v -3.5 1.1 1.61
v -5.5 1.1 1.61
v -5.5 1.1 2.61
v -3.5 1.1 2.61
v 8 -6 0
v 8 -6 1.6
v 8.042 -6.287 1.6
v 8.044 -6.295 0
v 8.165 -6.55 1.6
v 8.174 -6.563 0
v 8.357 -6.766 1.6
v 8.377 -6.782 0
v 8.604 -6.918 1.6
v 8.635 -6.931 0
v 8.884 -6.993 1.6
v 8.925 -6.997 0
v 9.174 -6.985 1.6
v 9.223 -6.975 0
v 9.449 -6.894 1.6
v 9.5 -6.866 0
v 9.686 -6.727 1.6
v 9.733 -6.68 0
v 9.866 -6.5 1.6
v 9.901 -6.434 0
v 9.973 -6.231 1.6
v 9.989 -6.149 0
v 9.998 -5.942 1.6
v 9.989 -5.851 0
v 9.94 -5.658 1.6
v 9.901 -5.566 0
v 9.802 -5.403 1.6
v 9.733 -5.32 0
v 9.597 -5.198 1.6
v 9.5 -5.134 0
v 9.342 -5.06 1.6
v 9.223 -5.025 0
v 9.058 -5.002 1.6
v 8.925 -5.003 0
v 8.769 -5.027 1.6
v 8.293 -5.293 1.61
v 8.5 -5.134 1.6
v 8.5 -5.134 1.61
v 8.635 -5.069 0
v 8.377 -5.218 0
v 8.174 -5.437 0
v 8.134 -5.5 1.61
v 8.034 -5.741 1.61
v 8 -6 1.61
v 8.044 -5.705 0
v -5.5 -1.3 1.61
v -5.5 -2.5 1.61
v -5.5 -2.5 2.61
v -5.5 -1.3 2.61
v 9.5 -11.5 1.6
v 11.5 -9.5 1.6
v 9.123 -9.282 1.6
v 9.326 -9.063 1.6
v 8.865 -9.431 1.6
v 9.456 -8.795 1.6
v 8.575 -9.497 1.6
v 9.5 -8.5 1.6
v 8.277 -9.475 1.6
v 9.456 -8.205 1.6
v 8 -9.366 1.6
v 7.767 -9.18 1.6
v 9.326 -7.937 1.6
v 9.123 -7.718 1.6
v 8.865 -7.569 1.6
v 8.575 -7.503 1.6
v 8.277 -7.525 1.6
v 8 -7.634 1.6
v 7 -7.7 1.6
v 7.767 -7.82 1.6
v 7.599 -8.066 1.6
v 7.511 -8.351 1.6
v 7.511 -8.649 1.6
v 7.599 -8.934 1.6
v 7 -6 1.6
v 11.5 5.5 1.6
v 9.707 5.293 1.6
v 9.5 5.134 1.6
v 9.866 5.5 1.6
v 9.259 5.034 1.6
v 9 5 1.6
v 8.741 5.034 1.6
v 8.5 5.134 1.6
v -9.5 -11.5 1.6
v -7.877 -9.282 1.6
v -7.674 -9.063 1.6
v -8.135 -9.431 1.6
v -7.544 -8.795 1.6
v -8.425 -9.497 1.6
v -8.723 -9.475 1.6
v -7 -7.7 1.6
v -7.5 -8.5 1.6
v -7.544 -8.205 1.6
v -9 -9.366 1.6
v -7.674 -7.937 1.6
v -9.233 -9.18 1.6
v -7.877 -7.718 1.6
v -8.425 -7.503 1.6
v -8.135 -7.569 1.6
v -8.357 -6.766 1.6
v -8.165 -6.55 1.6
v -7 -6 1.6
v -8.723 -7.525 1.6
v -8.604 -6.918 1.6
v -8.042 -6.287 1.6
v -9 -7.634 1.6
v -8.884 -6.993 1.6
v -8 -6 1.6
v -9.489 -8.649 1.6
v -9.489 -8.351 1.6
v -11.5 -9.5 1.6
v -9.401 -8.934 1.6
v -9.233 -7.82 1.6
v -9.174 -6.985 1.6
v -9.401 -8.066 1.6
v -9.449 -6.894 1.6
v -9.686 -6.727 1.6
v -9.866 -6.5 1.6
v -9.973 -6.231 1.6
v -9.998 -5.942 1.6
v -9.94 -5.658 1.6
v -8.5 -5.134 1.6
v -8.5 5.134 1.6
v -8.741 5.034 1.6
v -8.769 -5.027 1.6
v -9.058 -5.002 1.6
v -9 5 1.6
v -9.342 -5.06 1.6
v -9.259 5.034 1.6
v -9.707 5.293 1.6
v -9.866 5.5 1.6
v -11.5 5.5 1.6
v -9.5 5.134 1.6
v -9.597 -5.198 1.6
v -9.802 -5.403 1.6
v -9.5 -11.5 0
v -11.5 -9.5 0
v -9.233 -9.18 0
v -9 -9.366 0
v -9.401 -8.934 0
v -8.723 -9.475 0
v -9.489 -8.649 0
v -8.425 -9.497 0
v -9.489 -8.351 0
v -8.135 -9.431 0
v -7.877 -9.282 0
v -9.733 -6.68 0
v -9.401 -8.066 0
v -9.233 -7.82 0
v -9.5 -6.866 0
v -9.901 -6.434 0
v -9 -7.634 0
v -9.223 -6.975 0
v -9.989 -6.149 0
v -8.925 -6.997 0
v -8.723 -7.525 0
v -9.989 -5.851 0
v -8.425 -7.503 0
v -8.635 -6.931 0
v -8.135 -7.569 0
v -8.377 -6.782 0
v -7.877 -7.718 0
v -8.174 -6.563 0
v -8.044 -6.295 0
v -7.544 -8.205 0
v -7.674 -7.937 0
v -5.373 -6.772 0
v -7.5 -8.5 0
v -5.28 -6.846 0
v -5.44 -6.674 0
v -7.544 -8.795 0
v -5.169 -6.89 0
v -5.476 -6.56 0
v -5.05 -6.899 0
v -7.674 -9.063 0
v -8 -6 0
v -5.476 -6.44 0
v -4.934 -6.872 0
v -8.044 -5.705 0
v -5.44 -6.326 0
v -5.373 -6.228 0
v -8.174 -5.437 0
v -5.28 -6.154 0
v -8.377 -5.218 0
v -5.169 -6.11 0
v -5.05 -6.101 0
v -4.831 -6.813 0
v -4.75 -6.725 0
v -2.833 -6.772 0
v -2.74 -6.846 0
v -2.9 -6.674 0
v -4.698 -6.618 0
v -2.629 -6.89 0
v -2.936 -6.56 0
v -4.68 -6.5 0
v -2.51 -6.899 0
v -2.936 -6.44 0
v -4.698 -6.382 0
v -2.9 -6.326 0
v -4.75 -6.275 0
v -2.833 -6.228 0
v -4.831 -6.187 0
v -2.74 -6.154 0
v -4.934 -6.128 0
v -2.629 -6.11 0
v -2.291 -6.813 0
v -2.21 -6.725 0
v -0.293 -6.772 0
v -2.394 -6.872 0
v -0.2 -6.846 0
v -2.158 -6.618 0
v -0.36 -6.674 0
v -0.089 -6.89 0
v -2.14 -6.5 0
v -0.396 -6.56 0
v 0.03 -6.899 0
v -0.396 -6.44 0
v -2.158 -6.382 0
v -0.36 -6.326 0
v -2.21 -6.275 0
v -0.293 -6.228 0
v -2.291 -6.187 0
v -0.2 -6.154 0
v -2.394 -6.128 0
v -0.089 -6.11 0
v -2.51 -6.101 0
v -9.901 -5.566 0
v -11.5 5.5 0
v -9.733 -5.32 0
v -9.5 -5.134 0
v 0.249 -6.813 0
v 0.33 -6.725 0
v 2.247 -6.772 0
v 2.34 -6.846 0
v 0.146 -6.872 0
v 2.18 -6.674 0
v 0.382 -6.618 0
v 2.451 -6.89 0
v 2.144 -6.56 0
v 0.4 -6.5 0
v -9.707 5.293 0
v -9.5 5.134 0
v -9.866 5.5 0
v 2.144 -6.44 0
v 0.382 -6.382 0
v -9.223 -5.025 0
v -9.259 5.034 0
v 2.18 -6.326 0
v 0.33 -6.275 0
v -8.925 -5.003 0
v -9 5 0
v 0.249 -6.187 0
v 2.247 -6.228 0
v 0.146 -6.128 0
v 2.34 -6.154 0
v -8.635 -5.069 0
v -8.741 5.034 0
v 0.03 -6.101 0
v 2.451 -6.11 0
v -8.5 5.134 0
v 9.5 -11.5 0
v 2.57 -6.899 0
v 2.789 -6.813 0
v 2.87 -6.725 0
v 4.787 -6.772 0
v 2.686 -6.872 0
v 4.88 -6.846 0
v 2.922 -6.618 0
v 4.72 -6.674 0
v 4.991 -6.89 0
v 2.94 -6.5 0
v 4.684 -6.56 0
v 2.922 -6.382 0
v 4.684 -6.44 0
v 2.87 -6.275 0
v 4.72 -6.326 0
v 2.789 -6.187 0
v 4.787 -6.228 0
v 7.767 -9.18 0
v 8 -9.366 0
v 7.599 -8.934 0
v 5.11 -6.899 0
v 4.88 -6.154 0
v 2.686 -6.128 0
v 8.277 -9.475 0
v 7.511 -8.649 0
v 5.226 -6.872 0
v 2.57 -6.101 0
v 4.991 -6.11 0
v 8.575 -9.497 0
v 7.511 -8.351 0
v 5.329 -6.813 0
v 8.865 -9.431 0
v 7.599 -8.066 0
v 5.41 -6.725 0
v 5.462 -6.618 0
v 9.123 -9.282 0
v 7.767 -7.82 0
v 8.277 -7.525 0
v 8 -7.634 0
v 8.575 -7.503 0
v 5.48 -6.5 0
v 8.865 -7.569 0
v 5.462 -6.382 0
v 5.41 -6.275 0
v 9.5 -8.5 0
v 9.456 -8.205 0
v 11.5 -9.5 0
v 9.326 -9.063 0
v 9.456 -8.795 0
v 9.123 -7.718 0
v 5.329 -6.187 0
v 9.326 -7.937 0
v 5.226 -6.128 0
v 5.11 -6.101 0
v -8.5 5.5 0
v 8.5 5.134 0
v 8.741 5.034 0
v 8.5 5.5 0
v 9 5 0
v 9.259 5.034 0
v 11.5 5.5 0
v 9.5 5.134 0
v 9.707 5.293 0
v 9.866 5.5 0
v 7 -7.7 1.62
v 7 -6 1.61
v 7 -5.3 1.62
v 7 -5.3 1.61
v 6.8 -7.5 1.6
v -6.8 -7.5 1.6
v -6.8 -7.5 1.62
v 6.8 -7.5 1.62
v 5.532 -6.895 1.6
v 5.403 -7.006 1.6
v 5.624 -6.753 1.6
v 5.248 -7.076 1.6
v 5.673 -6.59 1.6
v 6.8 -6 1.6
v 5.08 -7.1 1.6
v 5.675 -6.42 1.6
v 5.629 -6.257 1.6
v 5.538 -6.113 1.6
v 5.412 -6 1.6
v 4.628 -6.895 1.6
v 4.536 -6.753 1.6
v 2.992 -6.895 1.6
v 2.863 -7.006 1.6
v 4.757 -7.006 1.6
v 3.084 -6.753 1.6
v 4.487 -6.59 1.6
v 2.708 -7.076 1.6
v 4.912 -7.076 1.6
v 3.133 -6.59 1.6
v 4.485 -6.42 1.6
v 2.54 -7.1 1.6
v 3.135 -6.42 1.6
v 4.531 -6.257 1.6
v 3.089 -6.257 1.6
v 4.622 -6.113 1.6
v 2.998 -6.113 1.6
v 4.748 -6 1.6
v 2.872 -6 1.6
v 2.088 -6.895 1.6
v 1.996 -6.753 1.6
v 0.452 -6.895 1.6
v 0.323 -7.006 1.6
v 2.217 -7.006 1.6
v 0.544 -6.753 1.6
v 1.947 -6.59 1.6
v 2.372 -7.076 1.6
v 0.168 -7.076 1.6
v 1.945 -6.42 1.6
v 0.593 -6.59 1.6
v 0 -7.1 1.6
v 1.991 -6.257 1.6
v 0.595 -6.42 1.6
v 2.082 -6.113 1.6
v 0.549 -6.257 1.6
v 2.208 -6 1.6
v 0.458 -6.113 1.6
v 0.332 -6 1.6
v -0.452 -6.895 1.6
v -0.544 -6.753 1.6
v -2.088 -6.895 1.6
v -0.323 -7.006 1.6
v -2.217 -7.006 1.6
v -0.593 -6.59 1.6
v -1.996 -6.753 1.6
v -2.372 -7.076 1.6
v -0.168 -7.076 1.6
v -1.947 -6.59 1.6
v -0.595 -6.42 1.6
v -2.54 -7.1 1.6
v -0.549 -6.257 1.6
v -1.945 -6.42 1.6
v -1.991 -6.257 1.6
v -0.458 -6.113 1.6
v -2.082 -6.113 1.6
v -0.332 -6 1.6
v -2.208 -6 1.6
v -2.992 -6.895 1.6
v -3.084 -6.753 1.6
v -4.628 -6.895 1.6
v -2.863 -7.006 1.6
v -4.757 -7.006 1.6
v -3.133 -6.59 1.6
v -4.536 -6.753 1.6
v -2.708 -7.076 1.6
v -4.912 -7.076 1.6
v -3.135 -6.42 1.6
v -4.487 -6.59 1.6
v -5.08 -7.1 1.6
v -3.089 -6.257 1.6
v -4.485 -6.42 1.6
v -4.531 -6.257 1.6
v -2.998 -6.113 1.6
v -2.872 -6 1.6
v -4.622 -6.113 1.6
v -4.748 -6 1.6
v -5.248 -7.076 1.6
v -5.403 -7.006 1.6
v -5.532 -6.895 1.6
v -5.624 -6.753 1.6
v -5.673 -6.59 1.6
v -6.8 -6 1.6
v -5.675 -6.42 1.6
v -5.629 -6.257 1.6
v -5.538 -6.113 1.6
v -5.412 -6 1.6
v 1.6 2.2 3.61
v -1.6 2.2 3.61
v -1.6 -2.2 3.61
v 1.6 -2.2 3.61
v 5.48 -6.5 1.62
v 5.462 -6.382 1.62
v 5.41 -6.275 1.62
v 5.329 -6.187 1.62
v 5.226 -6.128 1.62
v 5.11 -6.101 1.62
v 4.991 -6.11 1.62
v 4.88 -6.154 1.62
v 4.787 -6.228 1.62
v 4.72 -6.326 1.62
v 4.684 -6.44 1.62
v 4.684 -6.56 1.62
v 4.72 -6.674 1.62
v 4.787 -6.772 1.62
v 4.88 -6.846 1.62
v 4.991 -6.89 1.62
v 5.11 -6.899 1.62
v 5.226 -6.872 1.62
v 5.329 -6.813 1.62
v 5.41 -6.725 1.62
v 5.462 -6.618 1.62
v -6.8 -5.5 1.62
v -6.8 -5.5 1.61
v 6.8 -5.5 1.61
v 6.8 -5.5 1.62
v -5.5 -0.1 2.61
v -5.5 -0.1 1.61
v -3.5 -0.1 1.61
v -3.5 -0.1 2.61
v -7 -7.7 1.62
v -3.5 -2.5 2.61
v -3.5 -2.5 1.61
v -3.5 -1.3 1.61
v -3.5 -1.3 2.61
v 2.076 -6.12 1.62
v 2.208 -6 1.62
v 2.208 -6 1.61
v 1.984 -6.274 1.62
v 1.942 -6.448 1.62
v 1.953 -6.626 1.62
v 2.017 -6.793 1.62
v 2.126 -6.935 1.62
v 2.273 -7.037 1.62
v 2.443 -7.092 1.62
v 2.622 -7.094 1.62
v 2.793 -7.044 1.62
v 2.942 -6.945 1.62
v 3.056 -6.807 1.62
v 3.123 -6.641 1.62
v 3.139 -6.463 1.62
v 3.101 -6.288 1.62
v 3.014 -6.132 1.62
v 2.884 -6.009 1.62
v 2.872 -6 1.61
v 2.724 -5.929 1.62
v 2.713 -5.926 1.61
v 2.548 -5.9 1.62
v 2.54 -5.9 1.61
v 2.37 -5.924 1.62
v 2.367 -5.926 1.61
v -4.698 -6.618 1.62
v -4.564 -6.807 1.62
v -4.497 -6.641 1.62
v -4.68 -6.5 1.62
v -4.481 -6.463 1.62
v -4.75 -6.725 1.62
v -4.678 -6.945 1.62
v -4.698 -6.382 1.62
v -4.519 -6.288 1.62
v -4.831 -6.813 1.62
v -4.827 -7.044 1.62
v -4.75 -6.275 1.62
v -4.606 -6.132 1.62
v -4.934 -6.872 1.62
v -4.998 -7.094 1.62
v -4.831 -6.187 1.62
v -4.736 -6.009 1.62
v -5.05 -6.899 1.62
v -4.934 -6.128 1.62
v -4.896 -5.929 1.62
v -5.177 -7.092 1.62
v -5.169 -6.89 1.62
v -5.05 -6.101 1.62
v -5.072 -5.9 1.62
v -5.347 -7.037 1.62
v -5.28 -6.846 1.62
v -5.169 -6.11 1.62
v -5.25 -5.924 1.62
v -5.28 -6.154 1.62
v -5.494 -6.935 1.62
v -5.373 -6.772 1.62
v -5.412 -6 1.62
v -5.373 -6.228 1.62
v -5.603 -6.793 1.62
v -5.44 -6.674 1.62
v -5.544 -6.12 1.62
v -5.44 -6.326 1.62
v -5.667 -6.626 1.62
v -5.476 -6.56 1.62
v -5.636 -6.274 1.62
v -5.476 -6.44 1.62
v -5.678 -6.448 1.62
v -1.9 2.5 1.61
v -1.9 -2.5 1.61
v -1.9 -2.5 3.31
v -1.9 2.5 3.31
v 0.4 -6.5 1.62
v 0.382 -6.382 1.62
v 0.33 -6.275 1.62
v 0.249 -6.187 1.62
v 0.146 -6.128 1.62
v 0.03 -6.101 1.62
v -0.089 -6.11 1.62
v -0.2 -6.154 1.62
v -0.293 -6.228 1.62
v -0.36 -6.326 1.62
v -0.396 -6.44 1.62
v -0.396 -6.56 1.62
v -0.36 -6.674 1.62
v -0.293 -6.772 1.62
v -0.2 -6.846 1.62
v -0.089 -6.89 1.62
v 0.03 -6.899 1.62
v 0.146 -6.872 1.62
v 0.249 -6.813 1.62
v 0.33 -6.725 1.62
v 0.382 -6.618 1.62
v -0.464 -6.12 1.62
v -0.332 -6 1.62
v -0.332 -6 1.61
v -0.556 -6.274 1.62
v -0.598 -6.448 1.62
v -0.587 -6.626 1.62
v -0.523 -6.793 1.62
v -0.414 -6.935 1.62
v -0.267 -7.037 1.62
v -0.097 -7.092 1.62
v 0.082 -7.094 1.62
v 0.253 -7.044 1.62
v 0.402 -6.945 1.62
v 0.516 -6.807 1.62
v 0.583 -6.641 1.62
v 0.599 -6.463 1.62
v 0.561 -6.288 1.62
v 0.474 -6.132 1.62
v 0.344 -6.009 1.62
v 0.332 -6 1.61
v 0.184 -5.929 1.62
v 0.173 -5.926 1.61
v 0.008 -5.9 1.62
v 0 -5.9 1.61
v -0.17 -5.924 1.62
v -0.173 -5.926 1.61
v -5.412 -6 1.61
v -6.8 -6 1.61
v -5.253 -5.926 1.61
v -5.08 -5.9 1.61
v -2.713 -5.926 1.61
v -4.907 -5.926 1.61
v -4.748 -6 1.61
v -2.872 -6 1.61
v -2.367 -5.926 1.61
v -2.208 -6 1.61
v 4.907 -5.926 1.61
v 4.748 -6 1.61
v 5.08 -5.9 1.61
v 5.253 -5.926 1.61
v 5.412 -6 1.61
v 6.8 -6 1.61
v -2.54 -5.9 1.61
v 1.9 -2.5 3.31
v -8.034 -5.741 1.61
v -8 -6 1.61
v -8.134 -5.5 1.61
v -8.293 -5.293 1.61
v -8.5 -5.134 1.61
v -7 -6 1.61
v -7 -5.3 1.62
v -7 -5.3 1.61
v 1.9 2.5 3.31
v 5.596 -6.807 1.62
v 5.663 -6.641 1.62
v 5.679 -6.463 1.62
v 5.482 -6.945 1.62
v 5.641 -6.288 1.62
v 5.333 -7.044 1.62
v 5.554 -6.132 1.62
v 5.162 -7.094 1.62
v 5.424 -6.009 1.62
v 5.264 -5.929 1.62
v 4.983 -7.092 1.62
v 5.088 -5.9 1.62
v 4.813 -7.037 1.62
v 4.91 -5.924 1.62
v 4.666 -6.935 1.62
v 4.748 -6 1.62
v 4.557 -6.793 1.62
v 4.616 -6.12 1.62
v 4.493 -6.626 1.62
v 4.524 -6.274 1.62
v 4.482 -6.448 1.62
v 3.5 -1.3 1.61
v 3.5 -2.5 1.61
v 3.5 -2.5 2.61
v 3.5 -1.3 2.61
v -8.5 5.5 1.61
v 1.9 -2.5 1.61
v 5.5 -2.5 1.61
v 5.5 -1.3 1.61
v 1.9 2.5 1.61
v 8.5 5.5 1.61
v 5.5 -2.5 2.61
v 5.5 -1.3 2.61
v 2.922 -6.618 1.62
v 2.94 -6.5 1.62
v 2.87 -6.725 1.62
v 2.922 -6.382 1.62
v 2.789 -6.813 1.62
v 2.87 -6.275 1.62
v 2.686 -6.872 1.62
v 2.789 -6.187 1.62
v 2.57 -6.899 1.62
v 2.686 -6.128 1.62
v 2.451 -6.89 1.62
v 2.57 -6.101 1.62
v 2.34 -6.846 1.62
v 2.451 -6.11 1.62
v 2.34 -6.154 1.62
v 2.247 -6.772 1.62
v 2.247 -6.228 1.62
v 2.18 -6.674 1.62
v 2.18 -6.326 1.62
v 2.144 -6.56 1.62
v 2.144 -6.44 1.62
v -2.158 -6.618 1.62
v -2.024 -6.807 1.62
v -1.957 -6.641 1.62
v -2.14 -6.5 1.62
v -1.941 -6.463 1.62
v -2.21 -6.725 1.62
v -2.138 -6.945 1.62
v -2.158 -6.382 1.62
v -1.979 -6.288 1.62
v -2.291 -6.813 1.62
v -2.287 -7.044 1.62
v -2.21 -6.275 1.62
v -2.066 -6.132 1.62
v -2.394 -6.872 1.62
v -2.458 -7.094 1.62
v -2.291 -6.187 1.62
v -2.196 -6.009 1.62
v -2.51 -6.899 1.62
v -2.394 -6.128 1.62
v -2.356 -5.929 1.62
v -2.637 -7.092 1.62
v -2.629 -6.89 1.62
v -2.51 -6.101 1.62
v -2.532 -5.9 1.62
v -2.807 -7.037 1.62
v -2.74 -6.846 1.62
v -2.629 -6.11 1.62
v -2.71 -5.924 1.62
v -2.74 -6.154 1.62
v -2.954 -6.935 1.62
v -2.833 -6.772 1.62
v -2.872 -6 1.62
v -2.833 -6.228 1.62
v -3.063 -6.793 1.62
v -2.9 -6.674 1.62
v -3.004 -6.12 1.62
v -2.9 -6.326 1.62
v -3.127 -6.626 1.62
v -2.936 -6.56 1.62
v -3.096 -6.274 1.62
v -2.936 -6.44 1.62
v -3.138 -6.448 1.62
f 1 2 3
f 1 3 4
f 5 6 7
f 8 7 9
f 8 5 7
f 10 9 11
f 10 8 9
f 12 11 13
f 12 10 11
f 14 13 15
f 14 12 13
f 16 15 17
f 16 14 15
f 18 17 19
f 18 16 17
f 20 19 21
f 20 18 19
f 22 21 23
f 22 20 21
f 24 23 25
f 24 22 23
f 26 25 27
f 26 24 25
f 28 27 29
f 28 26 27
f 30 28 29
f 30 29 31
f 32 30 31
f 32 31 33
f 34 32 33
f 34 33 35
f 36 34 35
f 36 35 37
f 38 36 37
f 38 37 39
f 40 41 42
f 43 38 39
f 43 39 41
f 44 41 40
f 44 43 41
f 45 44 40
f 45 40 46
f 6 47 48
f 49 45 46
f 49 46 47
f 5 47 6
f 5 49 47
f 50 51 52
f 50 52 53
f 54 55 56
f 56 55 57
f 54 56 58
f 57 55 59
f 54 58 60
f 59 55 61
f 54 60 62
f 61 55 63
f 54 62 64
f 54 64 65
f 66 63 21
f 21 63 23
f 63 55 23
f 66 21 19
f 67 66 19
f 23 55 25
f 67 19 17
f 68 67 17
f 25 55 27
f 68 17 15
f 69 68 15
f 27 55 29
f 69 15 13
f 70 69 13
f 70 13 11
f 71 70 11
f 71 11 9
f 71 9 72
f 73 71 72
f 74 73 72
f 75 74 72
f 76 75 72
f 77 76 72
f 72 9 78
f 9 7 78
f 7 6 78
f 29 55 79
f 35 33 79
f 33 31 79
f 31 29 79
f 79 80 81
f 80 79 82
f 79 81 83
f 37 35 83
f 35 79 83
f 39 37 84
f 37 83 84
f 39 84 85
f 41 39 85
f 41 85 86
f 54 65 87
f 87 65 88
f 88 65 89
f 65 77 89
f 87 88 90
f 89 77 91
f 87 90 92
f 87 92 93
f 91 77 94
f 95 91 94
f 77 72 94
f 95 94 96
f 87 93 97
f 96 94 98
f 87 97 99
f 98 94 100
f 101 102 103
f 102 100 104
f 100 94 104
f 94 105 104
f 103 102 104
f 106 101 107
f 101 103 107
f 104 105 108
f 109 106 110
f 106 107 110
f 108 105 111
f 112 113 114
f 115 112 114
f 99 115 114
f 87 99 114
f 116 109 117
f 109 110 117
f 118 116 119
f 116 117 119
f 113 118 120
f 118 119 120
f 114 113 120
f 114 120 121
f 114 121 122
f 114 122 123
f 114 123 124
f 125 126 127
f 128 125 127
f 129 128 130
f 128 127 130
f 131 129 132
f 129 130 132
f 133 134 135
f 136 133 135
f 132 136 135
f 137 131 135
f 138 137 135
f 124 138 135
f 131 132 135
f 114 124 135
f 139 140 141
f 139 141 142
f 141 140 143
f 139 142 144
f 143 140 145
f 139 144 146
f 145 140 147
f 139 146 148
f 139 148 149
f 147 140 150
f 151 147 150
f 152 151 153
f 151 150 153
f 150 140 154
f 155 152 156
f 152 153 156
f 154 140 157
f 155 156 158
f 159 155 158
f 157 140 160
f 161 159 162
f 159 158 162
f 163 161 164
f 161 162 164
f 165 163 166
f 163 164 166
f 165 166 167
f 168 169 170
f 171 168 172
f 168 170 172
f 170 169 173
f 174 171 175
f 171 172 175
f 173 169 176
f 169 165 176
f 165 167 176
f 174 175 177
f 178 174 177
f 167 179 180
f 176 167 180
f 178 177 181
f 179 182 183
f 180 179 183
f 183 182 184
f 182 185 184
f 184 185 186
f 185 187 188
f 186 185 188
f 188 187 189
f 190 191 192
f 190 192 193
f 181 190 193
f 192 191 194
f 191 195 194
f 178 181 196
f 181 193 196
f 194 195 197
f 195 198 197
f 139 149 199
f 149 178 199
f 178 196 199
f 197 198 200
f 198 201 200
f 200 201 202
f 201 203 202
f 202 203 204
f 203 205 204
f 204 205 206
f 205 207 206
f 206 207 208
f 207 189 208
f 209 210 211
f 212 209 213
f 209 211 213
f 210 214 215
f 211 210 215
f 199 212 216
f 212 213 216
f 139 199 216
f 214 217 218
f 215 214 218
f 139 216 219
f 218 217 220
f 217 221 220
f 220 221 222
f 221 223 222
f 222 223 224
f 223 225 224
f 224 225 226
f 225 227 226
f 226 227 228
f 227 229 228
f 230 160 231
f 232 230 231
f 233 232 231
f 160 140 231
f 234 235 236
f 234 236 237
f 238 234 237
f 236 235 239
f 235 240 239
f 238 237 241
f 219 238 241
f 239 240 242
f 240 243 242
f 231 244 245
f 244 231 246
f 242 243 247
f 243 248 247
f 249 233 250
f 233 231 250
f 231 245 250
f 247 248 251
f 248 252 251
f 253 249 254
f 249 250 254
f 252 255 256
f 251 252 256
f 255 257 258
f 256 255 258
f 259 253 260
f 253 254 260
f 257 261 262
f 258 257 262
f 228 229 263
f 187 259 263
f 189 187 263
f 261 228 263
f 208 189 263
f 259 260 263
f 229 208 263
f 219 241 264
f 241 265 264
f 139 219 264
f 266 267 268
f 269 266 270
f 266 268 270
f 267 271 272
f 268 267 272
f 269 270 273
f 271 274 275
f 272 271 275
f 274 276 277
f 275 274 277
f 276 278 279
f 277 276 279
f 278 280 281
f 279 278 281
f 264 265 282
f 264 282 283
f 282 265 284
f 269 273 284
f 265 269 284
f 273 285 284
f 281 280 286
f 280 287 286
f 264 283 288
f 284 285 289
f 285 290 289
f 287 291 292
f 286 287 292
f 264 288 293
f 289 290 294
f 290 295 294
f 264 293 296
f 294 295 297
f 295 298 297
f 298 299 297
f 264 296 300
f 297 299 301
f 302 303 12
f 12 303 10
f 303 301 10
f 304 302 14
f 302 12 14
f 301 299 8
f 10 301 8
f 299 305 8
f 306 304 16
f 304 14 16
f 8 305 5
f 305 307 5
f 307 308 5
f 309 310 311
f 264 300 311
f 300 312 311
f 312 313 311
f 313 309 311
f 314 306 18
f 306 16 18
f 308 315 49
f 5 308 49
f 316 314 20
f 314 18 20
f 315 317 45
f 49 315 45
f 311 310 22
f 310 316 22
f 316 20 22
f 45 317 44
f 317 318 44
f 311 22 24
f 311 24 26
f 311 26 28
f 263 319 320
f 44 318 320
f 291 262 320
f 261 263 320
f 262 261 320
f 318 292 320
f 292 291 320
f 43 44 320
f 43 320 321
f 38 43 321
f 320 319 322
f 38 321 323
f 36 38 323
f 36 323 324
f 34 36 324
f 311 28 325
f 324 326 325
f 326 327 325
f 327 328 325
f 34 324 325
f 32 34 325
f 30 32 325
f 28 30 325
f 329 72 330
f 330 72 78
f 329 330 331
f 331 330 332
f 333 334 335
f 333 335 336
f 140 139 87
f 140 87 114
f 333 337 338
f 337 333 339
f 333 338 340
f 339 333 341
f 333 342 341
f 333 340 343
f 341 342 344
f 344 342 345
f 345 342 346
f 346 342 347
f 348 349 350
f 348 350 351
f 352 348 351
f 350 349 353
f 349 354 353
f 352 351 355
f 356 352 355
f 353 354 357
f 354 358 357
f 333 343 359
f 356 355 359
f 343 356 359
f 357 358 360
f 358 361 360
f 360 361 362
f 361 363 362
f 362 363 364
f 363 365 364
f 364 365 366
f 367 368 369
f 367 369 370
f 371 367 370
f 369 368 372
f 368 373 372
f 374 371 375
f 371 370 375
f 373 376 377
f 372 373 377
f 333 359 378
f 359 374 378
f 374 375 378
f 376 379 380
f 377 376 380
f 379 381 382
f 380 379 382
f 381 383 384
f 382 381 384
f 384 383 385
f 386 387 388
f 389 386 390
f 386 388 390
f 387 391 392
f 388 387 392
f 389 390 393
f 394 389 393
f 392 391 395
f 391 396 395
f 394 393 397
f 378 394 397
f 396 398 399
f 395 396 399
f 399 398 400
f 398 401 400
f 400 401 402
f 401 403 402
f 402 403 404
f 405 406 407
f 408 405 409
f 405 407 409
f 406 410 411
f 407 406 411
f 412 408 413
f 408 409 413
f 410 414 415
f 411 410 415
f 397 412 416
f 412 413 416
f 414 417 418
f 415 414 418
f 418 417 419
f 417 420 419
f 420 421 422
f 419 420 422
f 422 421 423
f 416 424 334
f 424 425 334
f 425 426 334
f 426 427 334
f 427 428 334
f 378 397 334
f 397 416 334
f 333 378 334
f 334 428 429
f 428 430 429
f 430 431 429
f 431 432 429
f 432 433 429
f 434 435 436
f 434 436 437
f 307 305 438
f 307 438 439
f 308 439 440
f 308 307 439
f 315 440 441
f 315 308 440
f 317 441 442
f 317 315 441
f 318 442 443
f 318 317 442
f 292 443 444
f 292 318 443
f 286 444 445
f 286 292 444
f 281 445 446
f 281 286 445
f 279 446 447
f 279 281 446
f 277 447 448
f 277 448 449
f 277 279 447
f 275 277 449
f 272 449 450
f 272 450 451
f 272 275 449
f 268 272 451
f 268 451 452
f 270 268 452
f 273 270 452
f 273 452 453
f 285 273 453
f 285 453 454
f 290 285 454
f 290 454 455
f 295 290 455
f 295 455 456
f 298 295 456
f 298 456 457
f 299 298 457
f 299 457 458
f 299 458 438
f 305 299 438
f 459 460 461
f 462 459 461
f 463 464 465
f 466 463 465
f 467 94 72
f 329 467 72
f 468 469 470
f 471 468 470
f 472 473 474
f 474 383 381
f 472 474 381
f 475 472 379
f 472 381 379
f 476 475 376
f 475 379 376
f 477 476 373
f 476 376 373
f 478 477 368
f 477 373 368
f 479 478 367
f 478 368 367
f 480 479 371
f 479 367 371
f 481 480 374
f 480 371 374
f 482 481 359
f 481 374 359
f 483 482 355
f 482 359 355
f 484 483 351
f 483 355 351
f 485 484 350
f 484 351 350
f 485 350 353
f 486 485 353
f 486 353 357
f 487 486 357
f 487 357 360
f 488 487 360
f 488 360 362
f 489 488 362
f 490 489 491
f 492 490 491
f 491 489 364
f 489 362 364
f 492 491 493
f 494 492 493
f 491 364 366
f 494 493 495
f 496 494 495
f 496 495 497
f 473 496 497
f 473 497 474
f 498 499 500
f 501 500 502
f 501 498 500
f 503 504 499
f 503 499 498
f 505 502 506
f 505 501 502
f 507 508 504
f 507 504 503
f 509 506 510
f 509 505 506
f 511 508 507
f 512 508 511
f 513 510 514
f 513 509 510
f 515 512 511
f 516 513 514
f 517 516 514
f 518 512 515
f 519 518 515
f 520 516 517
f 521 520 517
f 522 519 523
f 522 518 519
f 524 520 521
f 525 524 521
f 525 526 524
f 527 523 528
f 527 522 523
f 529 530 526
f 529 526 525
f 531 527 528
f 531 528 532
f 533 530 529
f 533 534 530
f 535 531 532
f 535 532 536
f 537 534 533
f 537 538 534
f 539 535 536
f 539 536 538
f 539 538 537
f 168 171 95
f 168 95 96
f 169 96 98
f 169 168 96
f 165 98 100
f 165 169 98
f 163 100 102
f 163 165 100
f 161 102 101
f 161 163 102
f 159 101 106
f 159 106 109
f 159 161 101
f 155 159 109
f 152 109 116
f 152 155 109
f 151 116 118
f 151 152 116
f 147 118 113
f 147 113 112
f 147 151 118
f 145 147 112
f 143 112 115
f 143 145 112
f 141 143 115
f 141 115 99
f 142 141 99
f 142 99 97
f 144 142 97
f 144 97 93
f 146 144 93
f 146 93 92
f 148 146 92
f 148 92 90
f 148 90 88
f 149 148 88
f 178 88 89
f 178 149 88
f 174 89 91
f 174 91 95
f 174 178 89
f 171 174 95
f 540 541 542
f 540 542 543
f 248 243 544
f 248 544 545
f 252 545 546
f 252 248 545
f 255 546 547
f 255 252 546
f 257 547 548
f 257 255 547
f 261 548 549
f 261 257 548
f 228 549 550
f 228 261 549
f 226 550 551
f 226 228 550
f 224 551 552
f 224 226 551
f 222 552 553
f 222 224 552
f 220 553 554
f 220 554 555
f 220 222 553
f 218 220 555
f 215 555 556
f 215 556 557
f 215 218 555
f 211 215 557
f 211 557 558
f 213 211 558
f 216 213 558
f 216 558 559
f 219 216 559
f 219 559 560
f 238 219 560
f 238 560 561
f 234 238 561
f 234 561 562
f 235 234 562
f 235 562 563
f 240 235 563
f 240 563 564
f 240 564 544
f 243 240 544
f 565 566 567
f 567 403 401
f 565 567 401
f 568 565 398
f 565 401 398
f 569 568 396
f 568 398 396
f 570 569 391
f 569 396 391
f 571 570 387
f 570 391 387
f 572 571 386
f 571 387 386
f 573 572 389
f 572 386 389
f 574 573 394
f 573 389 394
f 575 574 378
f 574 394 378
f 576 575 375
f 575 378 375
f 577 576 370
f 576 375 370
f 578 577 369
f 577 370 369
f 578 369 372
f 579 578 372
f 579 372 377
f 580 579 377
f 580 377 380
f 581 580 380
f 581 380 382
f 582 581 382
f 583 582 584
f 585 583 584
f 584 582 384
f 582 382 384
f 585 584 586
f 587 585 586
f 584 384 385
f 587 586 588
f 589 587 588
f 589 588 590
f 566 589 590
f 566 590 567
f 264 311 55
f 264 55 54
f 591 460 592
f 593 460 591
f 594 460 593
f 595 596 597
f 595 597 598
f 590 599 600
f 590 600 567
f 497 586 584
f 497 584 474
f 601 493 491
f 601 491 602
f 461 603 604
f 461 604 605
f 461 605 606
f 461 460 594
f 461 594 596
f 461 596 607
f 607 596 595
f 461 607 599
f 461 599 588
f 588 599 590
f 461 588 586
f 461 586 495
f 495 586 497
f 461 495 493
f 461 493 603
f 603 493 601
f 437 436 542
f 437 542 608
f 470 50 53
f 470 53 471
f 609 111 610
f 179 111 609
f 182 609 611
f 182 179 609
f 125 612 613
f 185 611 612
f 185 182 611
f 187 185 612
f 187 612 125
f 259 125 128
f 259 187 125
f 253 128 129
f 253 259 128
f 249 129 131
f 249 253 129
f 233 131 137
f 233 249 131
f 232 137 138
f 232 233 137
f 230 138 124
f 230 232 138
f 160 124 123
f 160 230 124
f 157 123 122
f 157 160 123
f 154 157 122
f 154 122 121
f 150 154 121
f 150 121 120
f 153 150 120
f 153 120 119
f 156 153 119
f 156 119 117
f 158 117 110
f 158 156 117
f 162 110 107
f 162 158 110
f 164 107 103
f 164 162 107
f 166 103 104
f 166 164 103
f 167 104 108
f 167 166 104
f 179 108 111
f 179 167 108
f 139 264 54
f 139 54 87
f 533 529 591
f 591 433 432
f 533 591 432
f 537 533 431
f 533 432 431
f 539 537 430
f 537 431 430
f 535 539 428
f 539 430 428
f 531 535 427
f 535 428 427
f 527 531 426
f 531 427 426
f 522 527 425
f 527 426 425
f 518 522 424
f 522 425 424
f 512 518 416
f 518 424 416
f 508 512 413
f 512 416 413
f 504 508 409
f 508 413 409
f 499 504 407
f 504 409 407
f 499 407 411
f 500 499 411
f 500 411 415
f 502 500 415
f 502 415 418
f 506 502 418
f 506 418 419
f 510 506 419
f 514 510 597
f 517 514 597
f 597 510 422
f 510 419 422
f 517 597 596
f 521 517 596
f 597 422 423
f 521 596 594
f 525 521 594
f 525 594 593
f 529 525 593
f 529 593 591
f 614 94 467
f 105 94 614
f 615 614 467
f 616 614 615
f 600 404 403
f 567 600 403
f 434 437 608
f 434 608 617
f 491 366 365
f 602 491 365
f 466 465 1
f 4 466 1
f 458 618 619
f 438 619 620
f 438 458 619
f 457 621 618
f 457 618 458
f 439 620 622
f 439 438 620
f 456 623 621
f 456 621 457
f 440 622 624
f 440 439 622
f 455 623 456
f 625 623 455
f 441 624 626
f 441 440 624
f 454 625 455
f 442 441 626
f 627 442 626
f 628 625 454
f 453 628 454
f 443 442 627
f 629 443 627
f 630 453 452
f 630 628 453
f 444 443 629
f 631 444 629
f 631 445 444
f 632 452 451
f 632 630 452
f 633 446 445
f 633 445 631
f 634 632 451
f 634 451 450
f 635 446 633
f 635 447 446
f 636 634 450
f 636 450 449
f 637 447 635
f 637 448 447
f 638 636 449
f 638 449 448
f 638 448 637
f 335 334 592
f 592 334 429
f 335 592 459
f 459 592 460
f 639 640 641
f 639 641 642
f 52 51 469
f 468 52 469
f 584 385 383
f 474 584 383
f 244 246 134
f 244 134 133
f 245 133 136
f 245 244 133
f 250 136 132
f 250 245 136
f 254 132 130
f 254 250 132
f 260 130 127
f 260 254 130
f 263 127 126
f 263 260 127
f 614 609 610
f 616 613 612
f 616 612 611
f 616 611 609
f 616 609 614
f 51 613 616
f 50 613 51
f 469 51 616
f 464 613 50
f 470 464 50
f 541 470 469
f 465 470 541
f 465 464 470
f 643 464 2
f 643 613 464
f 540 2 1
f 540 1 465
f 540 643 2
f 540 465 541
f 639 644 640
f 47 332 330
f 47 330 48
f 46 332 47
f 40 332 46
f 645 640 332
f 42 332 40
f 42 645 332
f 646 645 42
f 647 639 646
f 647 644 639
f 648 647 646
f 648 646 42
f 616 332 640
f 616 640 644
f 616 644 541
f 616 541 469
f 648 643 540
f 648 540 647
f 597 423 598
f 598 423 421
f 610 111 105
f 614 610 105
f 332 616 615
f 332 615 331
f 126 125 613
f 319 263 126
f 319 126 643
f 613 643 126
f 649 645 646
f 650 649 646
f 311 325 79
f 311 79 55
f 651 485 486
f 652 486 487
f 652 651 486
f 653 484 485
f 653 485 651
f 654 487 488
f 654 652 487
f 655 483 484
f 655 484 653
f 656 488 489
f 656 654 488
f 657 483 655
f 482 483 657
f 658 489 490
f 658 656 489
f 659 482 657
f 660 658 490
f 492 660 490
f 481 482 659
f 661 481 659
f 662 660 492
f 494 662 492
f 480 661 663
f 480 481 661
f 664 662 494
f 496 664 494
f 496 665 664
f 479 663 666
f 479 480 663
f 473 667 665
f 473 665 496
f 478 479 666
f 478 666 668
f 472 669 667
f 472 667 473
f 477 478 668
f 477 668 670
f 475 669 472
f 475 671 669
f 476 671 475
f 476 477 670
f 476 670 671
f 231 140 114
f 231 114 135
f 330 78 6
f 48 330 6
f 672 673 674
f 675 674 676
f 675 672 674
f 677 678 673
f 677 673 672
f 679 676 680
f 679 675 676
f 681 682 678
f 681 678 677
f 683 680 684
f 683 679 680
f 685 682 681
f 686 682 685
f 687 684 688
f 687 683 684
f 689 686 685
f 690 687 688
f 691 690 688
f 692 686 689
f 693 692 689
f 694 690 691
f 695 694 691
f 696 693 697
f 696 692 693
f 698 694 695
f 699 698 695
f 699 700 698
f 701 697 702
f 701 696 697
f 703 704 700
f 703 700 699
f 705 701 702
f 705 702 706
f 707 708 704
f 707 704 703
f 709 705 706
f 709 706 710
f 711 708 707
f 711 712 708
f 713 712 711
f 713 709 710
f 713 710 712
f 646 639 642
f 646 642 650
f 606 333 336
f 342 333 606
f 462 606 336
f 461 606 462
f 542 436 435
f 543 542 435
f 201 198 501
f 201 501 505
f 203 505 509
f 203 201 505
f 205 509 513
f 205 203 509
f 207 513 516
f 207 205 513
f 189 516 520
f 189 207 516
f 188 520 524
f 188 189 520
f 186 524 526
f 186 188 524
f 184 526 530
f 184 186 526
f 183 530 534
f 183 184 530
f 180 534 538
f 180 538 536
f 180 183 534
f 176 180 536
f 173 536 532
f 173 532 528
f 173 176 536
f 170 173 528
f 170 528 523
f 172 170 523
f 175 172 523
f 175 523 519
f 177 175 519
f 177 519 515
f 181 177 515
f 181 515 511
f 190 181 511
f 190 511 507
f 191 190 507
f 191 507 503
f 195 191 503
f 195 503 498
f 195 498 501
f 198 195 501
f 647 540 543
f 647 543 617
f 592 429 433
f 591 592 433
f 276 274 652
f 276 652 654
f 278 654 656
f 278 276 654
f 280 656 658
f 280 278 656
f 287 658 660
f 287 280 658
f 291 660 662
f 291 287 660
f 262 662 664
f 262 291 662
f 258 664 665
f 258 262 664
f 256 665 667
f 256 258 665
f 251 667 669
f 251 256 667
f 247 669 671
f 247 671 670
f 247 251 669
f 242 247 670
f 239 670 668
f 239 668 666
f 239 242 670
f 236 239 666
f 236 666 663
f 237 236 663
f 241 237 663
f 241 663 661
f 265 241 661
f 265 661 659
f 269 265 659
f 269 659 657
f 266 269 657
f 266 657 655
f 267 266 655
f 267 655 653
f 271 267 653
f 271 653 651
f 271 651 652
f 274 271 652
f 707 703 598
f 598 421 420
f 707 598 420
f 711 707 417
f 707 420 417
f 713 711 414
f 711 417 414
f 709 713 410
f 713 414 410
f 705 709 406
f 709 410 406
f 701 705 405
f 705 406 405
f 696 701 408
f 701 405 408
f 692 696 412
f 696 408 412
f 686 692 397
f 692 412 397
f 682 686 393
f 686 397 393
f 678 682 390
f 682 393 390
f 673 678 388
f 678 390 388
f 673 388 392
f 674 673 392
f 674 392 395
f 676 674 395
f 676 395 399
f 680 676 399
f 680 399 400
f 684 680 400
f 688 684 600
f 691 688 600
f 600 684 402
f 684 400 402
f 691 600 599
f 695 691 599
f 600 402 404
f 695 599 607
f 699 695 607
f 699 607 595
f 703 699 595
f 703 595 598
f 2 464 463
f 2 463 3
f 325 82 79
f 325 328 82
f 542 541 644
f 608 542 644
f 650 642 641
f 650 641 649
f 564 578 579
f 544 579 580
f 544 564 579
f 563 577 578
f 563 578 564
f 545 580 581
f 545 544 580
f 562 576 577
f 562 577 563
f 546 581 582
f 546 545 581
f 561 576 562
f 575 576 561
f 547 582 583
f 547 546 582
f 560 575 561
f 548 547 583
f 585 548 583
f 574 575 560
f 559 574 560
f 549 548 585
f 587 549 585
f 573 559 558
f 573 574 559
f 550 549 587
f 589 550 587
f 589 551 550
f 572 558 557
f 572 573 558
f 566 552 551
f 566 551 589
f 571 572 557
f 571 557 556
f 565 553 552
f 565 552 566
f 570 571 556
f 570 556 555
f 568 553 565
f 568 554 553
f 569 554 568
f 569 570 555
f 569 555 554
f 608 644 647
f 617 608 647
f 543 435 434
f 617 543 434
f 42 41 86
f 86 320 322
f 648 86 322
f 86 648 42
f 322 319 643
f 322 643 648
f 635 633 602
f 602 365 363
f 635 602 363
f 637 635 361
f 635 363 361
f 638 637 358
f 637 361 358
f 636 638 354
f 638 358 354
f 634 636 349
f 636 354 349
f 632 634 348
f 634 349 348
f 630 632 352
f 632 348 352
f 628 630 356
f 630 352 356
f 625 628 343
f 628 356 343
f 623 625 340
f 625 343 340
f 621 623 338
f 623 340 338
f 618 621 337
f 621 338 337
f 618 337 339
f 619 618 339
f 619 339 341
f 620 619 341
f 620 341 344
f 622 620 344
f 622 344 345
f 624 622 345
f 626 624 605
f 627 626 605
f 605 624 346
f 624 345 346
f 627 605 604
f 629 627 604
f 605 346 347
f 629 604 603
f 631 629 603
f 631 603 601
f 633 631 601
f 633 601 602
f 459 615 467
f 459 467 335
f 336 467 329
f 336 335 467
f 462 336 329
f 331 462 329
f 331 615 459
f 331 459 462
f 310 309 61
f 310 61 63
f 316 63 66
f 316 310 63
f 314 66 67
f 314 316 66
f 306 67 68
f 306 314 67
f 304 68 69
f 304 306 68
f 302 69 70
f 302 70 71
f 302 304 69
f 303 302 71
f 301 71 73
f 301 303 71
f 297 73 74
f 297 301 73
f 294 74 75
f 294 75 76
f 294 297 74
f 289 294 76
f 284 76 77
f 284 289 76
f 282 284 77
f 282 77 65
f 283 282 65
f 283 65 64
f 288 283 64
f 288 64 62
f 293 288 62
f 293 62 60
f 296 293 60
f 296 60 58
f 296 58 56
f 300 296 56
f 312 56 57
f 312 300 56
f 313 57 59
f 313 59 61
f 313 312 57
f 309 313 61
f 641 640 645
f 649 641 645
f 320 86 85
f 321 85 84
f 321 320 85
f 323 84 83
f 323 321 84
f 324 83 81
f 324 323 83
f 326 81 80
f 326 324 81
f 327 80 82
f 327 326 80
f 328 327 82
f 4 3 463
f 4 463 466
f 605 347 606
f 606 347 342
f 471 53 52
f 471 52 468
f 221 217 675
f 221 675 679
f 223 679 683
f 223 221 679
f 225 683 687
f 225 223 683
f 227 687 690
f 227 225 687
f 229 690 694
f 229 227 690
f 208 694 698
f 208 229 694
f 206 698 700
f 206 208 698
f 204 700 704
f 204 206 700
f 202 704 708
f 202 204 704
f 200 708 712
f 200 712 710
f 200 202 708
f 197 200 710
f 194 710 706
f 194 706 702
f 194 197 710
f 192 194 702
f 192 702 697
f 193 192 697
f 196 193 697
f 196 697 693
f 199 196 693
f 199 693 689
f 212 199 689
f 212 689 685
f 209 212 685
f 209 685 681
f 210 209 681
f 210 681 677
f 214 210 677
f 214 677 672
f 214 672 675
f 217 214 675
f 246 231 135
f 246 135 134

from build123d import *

# Parameters (mm, degrees)
SKETCH1_R           = 1
BOSS_EXTRUDE1_DEPTH = 1.6
SKETCH2_W           = 17
SKETCH2_H           = 12
BOSS_EXTRUDE2_DEPTH = 1.61
SKETCH3_W           = 14
SKETCH3_H           = 2.4
SKETCH3_W_2         = 13.6
SKETCH3_H_2         = 2
SKETCH3_R           = 0.6
SKETCH3_R_2         = 0.4
BOSS_EXTRUDE3_DEPTH = 1.62
SKETCH3_3_R         = 0.4
CUT_EXTRUDE1_DEPTH  = 2.62
BOSS_EXTRUDE4_START = 1.61
SKETCH4_W           = 3.8
SKETCH4_H           = 5
BOSS_EXTRUDE4_DEPTH = 2
BOSS_EXTRUDE5_START = 1.61
SKETCH5_W           = 2
SKETCH5_H           = 1.2
BOSS_EXTRUDE5_DEPTH = 1
CHAMFER1_SIZE       = 0.3
SKETCH6_R           = 1
SKETCH6_W           = 23
SKETCH6_H           = 6
CUT_EXTRUDE2_DEPTH  = 2


with BuildPart() as part:
    # Sketch1 → Boss-Extrude1 (new body)
    with BuildSketch(Plane.XY):
        Polygon((-11.5, 9.5), (-9.5, 11.5), (9.5, 11.5), (11.5, 9.5), (11.5, -9.5), (9.5, -11.5), (-9.5, -11.5), (-11.5, -9.5), align=None)
        with Locations((-9, 6)):
            Circle(SKETCH1_R, mode=Mode.SUBTRACT)
        with Locations((9, 6)):
            Circle(SKETCH1_R, mode=Mode.SUBTRACT)
        with Locations((-9, -6)):
            Circle(SKETCH1_R, mode=Mode.SUBTRACT)
        with Locations((9, -6)):
            Circle(SKETCH1_R, mode=Mode.SUBTRACT)
        with Locations((8.5, -8.5)):
            Circle(SKETCH1_R, mode=Mode.SUBTRACT)
        with Locations((-8.5, -8.5)):
            Circle(SKETCH1_R, mode=Mode.SUBTRACT)
    extrude(amount=BOSS_EXTRUDE1_DEPTH)

    # Sketch2 → Boss-Extrude2 (add)
    with BuildSketch(Plane.XY):
        Rectangle(SKETCH2_W, SKETCH2_H)
    extrude(amount=BOSS_EXTRUDE2_DEPTH)

    # Sketch3 → Boss-Extrude3 (add)
    with BuildSketch(Plane.XY):
        with Locations((0, -6.5)):
            Rectangle(SKETCH3_W, SKETCH3_H)
        with Locations((0, -6.5)):
            Rectangle(SKETCH3_W_2, SKETCH3_H_2, mode=Mode.SUBTRACT)
        with Locations(Location((-5.08, -6.5, 0), (0, 0, 123.557309762))):
            Circle(SKETCH3_R)
        with Locations((-5.08, -6.5)):
            Circle(SKETCH3_R_2, mode=Mode.SUBTRACT)
        with Locations(Location((-2.54, -6.5, 0), (0, 0, 123.557309762))):
            Circle(SKETCH3_R)
        with Locations((-2.54, -6.5)):
            Circle(SKETCH3_R_2, mode=Mode.SUBTRACT)
        with Locations(Location((0, -6.5, 0), (0, 0, 123.557309762))):
            Circle(SKETCH3_R)
        with Locations((0, -6.5)):
            Circle(SKETCH3_R_2, mode=Mode.SUBTRACT)
        with Locations(Location((5.08, -6.5, 0), (0, 0, 123.557309762))):
            Circle(SKETCH3_R)
        with Locations((5.08, -6.5)):
            Circle(SKETCH3_R_2, mode=Mode.SUBTRACT)
        with Locations(Location((2.54, -6.5, 0), (0, 0, 123.557309762))):
            Circle(SKETCH3_R)
        with Locations((2.54, -6.5)):
            Circle(SKETCH3_R_2, mode=Mode.SUBTRACT)
    extrude(amount=BOSS_EXTRUDE3_DEPTH)

    # Sketch3<3> → Cut-Extrude1 (cut)
    with BuildSketch(Plane.XY):
        with Locations((-5.08, -6.5)):
            Circle(SKETCH3_3_R)
        with Locations((-2.54, -6.5)):
            Circle(SKETCH3_3_R)
        with Locations((0, -6.5)):
            Circle(SKETCH3_3_R)
        with Locations((2.54, -6.5)):
            Circle(SKETCH3_3_R)
        with Locations((5.08, -6.5)):
            Circle(SKETCH3_3_R)
    extrude(amount=CUT_EXTRUDE1_DEPTH, mode=Mode.SUBTRACT)

    # Sketch4 → Boss-Extrude4 (add)
    with BuildSketch(Plane.XY.offset(BOSS_EXTRUDE4_START)):
        Rectangle(SKETCH4_W, SKETCH4_H)
    extrude(amount=BOSS_EXTRUDE4_DEPTH)

    # Sketch5 → Boss-Extrude5 (add)
    with BuildSketch(Plane.XY.offset(BOSS_EXTRUDE5_START)):
        with Locations((-4.500129294, -1.9)):
            Rectangle(SKETCH5_W, SKETCH5_H)
        with Locations((-4.5, 0.5)):
            Rectangle(SKETCH5_W, SKETCH5_H)
        with Locations((4.5, -1.9)):
            Rectangle(SKETCH5_W, SKETCH5_H)
    extrude(amount=BOSS_EXTRUDE5_DEPTH)

    # Chamfer1
    chamfer1_edges = [part.edges().sort_by_distance(p)[0] for p in [
        (1.9, 0, 3.61),
        (0, 2.5, 3.61),
        (-1.9, 0, 3.61),
        (0, -2.5, 3.61),
    ]]
    chamfer(chamfer1_edges, length=CHAMFER1_SIZE)

    # Sketch6 → Cut-Extrude2 (cut)
    with BuildSketch(Plane.XY):
        with Locations(Location((9, -6, 0), (0, 0, 180))):
            Circle(SKETCH6_R)
        with Locations((-9, -6)):
            Circle(SKETCH6_R)
        with Locations((0, 8.5)):
            Rectangle(SKETCH6_W, SKETCH6_H)
    extrude(amount=CUT_EXTRUDE2_DEPTH, mode=Mode.SUBTRACT)


solid = part.part
